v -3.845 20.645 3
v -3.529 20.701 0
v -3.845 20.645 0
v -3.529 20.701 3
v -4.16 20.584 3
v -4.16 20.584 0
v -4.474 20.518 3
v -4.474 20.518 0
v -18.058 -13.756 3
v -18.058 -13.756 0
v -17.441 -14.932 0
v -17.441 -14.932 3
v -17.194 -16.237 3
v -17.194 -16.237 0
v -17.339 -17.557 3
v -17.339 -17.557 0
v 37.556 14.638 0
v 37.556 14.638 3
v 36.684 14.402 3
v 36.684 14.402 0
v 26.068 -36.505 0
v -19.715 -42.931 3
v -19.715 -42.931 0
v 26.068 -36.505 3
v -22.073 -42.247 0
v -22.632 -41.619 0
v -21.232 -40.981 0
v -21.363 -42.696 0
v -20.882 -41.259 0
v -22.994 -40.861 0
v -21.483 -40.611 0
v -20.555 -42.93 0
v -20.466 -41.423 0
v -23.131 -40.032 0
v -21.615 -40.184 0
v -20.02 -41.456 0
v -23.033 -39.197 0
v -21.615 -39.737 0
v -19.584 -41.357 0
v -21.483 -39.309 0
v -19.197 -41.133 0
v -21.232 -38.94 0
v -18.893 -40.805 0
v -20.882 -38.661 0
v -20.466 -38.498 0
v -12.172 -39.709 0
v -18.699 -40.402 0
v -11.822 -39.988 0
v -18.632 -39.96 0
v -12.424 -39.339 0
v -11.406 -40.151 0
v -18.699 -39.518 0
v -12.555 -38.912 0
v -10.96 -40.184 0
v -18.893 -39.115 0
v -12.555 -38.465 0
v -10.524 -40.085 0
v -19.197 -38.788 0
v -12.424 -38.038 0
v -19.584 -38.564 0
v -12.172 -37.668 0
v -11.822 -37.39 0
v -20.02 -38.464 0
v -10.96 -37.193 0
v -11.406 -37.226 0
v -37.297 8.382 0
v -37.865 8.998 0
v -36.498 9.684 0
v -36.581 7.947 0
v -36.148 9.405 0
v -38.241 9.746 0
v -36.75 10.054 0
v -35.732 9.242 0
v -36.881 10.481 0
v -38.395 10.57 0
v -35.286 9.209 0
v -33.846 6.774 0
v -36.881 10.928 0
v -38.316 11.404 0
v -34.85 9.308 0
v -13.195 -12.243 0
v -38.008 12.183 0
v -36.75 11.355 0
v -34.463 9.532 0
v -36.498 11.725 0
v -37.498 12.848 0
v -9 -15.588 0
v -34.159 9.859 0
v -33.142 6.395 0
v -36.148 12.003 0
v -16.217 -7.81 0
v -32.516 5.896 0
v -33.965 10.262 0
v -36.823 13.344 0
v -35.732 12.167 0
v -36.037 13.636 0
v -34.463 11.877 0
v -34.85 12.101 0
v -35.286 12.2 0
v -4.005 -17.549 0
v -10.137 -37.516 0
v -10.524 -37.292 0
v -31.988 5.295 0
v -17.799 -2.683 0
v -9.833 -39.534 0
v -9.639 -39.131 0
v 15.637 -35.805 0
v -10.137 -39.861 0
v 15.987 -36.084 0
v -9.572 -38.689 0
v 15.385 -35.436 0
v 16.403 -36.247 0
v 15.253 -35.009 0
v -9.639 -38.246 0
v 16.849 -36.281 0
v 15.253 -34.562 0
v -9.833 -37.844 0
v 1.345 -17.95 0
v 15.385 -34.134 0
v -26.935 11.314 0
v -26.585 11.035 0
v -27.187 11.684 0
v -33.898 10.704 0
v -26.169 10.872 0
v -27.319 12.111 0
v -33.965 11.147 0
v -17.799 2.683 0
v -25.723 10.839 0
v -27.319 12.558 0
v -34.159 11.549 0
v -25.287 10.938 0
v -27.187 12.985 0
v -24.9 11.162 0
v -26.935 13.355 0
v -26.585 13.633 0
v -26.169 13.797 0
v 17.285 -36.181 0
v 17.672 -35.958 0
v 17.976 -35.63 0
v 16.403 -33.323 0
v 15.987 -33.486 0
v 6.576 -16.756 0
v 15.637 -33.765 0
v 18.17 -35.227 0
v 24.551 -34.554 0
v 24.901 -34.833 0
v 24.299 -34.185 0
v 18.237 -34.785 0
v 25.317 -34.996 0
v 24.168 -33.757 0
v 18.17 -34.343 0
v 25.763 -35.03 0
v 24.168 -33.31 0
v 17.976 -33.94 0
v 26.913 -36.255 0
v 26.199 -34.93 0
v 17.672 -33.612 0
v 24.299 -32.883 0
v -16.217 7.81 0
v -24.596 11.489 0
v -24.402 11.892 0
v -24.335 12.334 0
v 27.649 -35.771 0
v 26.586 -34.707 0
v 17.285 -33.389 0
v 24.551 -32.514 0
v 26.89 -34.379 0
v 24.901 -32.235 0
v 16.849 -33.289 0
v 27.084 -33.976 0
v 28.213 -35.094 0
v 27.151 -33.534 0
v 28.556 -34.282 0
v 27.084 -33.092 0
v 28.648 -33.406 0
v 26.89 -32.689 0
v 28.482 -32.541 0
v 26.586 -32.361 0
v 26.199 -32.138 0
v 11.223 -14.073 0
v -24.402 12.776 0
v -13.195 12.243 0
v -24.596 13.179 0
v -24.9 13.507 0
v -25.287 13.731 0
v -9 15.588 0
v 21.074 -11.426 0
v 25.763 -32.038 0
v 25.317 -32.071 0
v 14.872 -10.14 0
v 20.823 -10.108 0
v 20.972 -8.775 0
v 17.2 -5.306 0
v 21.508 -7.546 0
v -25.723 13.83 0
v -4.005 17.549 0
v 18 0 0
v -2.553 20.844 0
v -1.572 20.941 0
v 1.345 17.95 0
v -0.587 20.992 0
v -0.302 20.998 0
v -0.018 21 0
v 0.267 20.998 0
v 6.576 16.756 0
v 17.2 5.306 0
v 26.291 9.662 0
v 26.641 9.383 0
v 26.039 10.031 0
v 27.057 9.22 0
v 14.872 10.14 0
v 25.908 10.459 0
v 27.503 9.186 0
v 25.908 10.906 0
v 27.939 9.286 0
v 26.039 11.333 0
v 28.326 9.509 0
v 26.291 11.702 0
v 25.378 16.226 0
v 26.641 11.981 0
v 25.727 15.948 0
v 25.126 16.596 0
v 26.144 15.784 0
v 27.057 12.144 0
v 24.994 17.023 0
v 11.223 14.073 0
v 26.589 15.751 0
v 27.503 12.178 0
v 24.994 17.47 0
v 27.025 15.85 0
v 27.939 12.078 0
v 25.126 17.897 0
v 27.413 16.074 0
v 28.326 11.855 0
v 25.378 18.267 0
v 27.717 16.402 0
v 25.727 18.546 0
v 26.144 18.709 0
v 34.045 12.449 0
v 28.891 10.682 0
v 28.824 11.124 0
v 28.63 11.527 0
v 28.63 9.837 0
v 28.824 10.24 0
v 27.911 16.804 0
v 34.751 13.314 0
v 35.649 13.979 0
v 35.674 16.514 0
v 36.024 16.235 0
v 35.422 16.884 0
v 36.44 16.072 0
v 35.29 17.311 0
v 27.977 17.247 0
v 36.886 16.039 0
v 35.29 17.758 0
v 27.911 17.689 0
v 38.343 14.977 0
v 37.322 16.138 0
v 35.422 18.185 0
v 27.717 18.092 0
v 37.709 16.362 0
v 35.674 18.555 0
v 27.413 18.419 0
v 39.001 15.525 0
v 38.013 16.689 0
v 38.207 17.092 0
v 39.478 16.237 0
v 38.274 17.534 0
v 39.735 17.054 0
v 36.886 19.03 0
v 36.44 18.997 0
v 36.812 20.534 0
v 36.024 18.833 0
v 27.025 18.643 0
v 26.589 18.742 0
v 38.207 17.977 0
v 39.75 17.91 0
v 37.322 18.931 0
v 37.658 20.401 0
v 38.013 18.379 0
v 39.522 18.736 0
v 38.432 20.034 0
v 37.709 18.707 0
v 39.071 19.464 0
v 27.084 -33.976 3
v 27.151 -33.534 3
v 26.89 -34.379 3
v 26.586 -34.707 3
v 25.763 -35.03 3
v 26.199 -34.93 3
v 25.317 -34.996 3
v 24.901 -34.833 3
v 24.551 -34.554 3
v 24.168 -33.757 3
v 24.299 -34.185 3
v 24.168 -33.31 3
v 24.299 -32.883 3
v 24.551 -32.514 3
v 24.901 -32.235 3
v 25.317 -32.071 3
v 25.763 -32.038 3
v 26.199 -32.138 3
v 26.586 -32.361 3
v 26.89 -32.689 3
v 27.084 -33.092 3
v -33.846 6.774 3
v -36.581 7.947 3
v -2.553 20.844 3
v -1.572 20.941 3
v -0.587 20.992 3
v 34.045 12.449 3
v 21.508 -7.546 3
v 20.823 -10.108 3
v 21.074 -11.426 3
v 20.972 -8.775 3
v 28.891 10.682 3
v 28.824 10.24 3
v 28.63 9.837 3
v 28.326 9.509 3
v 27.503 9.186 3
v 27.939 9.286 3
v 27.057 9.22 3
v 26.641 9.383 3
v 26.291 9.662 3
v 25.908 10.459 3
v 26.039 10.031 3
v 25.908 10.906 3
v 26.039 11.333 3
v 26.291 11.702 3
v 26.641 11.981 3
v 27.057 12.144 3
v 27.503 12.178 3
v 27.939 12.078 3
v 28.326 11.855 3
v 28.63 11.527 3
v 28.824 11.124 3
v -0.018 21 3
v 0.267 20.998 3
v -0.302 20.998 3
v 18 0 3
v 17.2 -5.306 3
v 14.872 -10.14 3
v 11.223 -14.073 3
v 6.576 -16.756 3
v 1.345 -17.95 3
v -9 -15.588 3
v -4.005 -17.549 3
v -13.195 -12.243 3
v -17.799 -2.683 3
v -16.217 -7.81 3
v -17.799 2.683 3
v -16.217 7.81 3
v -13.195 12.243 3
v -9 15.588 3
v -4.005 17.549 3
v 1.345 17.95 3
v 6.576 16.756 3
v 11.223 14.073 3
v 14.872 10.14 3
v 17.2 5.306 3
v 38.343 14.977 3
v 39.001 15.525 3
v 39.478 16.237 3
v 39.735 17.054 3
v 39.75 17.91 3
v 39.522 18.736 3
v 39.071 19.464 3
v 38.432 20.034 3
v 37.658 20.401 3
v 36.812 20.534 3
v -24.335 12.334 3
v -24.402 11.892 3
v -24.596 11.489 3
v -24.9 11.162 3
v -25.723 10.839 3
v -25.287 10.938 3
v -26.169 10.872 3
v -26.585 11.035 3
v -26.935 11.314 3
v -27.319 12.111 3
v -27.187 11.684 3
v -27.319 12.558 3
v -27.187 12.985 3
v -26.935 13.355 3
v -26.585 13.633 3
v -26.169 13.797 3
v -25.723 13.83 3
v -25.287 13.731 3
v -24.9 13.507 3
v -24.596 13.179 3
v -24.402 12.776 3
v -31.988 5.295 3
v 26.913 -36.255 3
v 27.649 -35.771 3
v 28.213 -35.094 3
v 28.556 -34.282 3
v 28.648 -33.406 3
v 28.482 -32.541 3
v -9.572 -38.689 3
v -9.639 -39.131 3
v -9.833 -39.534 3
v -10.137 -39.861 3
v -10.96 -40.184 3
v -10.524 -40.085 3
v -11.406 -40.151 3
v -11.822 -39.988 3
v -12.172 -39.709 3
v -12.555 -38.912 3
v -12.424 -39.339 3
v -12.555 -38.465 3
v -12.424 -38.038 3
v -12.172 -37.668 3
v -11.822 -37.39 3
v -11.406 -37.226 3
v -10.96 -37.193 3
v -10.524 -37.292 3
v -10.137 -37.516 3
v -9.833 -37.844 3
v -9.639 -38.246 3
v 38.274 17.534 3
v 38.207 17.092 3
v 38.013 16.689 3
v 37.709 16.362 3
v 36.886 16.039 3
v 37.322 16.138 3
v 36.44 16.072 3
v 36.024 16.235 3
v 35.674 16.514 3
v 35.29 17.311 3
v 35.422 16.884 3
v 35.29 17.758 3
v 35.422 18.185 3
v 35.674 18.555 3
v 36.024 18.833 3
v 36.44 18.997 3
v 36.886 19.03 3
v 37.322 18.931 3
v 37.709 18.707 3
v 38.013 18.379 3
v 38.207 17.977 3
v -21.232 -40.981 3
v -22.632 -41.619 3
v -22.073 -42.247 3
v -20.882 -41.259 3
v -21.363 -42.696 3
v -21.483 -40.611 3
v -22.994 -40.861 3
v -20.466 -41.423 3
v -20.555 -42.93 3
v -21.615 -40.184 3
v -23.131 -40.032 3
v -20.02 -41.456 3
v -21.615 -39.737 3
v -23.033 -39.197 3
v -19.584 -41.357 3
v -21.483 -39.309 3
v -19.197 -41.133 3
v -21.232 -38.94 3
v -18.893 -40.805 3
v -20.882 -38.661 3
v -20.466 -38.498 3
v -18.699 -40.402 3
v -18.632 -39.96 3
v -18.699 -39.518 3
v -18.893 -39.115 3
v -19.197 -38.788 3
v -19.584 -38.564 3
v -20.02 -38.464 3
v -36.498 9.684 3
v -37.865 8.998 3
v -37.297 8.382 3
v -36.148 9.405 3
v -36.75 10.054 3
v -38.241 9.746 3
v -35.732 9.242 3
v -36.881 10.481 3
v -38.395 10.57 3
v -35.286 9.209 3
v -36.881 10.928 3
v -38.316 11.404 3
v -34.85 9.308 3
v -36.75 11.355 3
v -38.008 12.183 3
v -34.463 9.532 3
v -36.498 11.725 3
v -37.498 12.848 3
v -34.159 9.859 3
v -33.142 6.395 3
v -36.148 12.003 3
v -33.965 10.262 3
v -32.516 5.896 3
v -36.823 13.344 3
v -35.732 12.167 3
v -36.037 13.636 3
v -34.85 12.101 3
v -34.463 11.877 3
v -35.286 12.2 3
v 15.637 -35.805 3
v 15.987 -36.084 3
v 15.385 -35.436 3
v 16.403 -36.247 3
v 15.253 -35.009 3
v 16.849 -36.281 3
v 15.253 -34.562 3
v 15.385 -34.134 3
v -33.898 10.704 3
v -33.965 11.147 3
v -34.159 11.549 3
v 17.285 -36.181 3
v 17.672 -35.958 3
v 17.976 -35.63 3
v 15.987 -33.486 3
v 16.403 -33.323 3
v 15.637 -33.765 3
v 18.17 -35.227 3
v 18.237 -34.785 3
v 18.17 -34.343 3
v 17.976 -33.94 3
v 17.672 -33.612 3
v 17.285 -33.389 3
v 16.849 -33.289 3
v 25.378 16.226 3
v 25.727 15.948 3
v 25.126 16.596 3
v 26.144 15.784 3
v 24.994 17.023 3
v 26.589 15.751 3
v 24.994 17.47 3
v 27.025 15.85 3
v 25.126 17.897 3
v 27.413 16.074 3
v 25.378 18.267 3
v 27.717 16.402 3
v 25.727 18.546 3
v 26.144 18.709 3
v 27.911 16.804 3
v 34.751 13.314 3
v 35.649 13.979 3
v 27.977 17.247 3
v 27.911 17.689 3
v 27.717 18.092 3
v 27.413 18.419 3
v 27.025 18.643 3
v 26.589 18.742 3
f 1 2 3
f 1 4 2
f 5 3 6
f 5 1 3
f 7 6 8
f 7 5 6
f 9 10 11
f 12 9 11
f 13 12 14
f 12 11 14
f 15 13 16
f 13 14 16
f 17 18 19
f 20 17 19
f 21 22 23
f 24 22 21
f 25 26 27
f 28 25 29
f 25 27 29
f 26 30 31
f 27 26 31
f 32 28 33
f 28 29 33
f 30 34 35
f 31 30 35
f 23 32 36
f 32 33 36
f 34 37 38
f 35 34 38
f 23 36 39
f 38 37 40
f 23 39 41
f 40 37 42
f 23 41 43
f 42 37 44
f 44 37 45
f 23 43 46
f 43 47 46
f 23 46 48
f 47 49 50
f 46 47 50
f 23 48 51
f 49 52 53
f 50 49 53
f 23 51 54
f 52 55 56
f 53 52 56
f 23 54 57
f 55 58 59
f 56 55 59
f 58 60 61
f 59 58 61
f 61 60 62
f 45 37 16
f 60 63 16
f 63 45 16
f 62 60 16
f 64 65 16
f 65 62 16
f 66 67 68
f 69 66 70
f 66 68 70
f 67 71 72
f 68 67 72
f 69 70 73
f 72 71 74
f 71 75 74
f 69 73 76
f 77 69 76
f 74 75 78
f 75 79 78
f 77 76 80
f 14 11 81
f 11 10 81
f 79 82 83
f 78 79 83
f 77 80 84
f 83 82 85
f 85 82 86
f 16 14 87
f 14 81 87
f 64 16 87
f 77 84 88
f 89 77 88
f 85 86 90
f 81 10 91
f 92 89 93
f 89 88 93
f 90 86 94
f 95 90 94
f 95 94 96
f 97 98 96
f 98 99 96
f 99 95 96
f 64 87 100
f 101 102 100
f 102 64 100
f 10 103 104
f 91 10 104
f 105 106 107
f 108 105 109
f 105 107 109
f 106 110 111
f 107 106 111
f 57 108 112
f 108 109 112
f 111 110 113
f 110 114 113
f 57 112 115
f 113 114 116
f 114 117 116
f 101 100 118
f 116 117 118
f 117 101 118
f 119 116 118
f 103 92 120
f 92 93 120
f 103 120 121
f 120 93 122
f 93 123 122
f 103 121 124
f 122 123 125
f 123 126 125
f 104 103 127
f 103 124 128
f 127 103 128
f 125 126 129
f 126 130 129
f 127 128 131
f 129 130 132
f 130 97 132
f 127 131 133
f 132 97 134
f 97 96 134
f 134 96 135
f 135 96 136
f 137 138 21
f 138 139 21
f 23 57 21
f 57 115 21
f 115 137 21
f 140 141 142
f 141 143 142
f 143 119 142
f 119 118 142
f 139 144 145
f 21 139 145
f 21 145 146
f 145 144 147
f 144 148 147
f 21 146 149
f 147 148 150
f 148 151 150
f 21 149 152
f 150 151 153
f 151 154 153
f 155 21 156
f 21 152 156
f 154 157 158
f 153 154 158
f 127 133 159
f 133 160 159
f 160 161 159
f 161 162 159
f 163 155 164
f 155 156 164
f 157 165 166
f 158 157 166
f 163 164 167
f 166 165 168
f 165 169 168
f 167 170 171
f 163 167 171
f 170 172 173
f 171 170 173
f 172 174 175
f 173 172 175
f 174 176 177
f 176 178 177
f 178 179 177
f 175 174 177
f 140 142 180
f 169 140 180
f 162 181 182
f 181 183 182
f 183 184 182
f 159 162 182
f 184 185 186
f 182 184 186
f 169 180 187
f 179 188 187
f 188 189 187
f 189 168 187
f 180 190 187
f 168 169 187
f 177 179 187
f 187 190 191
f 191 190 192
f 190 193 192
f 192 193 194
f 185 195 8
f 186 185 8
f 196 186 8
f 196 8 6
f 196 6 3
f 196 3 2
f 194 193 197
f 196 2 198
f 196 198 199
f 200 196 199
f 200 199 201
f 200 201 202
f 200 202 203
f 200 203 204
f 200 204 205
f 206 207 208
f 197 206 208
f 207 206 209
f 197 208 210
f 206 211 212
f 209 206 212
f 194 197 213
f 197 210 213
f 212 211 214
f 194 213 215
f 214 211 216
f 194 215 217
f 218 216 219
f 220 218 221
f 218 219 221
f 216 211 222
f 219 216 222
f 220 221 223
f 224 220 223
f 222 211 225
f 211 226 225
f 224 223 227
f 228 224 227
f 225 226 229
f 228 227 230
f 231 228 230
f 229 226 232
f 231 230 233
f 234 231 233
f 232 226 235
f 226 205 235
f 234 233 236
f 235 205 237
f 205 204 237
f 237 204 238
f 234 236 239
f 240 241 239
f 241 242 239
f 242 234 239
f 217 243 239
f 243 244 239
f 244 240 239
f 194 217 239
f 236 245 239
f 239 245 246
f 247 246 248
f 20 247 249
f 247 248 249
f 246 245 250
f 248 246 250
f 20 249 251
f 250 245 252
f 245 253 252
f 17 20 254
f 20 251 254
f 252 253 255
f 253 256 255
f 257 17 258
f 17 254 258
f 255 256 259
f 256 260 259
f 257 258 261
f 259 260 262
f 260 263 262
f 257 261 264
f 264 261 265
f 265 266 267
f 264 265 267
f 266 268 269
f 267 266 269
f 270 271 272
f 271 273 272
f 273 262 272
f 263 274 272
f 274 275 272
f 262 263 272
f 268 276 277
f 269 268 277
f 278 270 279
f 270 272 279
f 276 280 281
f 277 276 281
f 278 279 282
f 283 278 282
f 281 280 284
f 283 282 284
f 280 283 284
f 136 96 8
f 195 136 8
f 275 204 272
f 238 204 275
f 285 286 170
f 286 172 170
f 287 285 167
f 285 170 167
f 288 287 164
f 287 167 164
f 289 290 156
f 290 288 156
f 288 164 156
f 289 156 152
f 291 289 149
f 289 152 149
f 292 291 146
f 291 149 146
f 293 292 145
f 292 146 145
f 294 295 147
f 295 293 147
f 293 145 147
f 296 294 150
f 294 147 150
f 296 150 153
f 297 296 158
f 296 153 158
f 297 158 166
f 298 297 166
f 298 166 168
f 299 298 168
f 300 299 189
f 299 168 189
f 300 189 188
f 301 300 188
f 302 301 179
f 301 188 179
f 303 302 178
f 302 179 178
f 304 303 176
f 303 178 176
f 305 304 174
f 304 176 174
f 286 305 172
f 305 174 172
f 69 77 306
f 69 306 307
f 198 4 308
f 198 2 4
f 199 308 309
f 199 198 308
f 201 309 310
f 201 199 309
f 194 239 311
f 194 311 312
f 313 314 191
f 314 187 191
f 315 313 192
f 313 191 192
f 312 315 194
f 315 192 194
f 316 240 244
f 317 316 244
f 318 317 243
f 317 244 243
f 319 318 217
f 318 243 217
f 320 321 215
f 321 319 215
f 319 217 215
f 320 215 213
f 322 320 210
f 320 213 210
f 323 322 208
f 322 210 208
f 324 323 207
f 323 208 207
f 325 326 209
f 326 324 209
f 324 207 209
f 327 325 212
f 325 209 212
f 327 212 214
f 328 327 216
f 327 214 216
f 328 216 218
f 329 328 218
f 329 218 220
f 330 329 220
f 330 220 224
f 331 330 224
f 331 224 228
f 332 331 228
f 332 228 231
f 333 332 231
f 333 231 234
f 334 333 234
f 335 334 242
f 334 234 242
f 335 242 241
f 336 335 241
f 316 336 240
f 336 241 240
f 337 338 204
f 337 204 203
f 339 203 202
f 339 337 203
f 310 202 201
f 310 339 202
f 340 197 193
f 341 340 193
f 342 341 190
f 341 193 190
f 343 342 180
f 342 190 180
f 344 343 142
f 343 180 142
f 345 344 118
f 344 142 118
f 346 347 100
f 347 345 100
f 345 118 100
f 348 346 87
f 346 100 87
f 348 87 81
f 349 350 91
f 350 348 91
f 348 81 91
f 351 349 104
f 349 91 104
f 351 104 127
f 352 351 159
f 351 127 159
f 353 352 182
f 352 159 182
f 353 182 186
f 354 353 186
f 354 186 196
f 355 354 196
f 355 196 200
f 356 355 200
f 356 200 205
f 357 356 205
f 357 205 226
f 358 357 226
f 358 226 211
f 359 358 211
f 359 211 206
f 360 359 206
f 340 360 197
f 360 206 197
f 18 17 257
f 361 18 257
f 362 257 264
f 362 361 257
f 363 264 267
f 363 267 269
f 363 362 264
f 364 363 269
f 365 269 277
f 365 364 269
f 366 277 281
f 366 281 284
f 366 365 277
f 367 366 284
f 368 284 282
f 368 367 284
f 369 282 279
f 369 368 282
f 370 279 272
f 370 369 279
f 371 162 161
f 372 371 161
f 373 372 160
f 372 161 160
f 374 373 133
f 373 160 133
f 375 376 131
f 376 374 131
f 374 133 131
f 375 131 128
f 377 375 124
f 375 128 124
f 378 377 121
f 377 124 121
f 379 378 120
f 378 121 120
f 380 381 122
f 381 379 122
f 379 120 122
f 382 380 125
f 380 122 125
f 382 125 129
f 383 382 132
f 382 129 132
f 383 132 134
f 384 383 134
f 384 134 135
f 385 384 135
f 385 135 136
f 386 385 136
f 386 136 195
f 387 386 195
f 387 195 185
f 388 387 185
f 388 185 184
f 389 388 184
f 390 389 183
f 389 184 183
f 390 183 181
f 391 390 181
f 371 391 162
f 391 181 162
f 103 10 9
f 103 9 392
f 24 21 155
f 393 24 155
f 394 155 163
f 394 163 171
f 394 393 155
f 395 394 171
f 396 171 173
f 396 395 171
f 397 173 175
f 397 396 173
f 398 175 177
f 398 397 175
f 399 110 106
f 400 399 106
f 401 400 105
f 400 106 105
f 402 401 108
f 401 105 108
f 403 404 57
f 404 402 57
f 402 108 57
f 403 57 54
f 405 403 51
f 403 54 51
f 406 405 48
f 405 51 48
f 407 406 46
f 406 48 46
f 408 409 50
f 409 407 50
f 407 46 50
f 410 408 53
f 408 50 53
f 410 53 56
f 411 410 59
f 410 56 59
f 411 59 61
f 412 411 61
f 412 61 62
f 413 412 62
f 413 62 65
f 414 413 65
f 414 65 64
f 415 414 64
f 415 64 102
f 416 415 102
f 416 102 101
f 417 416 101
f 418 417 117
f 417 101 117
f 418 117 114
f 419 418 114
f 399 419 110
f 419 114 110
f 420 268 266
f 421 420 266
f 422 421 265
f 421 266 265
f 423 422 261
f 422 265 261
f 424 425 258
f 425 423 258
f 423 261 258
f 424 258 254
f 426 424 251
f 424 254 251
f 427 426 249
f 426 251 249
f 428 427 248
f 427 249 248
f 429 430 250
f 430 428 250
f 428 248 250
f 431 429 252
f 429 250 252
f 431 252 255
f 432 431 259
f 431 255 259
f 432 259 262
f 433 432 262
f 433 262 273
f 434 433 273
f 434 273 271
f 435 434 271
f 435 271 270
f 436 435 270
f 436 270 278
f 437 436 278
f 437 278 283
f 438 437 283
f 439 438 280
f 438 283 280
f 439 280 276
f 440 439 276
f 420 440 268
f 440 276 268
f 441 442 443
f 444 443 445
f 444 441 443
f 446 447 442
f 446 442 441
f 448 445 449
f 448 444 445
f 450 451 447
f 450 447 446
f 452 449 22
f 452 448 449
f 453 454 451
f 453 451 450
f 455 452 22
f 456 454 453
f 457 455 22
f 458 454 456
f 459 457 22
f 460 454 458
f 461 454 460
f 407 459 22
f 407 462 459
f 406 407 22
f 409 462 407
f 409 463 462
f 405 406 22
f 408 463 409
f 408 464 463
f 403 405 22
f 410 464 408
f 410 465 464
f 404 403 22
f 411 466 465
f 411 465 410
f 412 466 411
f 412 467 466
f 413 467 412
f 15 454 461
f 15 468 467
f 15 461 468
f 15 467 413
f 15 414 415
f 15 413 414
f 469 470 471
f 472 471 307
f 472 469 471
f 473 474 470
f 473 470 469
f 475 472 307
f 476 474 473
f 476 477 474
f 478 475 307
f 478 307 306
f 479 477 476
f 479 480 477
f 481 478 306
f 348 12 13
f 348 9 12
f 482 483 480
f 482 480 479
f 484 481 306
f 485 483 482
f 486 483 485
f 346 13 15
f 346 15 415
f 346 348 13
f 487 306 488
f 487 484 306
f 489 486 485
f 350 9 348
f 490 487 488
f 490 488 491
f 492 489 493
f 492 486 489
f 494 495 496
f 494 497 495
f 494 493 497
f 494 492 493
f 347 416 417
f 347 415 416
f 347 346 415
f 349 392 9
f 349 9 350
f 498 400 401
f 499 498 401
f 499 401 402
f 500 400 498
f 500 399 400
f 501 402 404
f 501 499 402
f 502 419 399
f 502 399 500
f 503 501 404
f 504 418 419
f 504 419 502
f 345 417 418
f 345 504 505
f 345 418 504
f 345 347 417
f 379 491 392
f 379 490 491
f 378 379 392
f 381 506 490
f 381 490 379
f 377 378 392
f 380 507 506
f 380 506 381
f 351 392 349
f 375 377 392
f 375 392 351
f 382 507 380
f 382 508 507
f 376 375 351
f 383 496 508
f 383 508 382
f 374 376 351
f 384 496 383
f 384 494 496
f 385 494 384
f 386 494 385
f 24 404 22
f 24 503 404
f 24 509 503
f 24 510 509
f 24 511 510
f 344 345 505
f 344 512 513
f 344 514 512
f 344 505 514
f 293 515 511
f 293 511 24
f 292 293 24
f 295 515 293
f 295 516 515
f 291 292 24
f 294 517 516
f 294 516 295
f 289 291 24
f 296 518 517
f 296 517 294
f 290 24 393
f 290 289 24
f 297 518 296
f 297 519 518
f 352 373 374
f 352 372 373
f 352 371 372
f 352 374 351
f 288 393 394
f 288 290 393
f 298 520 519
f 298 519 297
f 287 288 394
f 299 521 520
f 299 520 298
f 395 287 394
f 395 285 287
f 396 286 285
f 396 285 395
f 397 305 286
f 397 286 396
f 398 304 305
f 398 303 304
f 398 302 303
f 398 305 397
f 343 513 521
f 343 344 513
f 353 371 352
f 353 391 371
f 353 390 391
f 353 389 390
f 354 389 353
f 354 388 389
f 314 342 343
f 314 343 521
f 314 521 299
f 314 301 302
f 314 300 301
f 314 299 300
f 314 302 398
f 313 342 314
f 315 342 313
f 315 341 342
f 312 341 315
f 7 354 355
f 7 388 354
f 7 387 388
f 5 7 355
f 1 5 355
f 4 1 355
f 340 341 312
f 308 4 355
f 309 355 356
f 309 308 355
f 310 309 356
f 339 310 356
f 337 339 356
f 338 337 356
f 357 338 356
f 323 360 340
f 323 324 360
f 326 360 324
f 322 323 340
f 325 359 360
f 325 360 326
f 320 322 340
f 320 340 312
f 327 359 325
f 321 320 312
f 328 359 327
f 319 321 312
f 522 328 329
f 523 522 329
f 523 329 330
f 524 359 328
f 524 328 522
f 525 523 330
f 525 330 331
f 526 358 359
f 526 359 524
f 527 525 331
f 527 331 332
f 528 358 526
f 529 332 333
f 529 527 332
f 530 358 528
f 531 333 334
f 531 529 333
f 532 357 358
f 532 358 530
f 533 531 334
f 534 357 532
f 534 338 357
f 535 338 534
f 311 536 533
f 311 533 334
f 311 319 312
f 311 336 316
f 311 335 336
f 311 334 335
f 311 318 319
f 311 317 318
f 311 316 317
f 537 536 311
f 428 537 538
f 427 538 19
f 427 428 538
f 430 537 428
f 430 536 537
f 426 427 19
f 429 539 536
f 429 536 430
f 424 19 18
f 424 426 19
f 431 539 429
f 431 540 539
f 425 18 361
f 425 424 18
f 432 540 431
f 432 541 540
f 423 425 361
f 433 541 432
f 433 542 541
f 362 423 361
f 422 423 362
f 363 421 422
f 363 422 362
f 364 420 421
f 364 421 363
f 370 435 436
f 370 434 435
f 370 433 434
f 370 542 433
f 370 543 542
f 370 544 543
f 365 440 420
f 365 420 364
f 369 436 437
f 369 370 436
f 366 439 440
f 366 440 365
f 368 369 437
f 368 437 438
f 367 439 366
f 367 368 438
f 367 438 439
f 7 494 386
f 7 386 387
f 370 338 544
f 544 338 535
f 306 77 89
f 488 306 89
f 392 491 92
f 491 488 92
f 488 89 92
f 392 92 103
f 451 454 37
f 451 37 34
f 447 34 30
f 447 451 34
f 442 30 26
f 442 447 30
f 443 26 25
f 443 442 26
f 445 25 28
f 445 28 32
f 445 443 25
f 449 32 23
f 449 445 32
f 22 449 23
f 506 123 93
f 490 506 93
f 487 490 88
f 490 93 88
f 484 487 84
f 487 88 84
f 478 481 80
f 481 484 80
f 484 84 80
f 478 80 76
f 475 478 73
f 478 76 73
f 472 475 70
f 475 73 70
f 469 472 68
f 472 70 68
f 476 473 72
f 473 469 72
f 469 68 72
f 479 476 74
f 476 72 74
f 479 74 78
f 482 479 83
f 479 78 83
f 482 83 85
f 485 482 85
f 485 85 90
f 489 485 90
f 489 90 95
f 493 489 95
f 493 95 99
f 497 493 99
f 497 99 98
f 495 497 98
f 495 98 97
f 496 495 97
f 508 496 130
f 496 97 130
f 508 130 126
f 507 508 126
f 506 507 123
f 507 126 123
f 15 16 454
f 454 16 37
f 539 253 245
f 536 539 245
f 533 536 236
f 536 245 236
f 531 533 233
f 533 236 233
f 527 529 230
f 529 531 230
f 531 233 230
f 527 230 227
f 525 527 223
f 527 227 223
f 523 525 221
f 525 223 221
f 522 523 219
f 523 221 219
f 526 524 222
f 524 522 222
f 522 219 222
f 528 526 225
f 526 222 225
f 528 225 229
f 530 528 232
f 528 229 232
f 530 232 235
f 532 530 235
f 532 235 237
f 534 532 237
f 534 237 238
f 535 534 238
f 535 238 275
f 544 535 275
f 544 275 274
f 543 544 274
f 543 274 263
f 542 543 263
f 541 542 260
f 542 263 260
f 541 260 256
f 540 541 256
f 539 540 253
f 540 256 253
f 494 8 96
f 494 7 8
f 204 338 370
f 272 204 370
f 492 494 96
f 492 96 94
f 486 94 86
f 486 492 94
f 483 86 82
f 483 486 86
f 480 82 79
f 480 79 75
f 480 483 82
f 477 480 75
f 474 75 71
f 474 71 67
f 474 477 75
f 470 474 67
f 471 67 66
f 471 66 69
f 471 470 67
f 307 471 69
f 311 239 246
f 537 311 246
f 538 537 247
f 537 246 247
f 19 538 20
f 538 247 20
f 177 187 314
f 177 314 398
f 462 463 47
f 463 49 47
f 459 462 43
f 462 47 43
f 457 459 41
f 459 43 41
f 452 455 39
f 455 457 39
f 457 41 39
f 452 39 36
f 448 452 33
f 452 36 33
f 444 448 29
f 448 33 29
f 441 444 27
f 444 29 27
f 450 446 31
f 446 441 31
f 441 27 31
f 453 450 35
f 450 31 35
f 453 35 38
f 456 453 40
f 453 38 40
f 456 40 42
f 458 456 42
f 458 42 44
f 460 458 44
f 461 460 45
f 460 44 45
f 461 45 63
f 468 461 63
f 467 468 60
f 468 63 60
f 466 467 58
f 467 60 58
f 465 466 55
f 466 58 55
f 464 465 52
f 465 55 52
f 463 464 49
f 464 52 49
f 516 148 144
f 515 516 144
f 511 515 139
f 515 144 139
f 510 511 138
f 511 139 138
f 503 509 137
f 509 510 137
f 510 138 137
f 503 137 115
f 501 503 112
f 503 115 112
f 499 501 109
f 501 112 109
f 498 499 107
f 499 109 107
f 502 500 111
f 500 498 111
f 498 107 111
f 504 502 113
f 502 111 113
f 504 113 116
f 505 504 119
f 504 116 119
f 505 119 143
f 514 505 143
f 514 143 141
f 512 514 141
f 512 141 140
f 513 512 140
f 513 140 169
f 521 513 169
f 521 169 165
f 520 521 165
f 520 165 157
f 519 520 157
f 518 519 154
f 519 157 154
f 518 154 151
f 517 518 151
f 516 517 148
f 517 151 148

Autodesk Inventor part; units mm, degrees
ref_plane "YZ Plane" through (0, 0, 0) normal (1, 0, 0) x (0, 1, 0)
ref_plane "XZ Plane" through (0, 0, 0) normal (0, 1, 0) x (-1, 0, 0)
ref_plane "XY Plane" through (0, 0, 0) normal (0, 0, 1) x (1, 0, 0)
sketch "スケッチ1" plane through (0, 0, 0) normal (0, 0, 1) x (1, 0, 0)
  circle A0 centre (0, 0) radius 20.55 construction
  circle A1 centre (-21.690847, -16.4118) radius 19.1 construction
  circle A2 centre (25.320198, -9.936175) radius 19.1 construction
  circle A3 centre (-50.601037, 30.814282) radius 1.5
  circle A4 centre (5.936242, 53.5882) radius 1.5
  circle A5 centre (27.390781, 10.682087) radius 1.5
  circle A6 centre (-42.891368, 18.388671) radius 1.5
  circle A7 centre (-21.690847, -16.4118) radius 4.025
  circle A8 centre (25.320198, -9.936175) radius 4.025
  circle A9 centre (0, 0) radius 4
  line L0 (-17.878475, -18.802579) -> (-30.416782, -38.796349) construction
  arc A10 (-17.878475, -18.802579) -> (-19.249319, -12.631728) centre (-21.690847, -16.4118) ccw construction
  line L1 (-19.249319, -12.631728) -> (-39.073694, 0.17273) construction
  line L2 (37.140856, -30.852246) -> (21.88658, -12.844829) construction
  arc A11 (22.365904, -6.541746) -> (21.88658, -12.844829) centre (25.320198, -9.936175) ccw construction
  line L3 (22.365904, -6.541746) -> (40.167798, 8.951885) construction
  line L4 (-21.690847, -16.4118) -> (-99.974162, 13.5882) construction
  line L5 (-105.525669, -16.4118) -> (-21.690847, -16.4118) construction
  line L6 (-21.690847, -16.4118) -> (-101.711328, -41.4118) construction
  line L7 (25.320198, -9.936175) -> (102.538646, -46.4118) construction
  line L8 (110.474331, -16.4118) -> (25.320198, -9.936175) construction
  line L9 (25.320198, -9.936175) -> (108.686903, 8.5882) construction
  line L10 (-18.05831, -13.755735) -> (-31.987893, 5.294901) construction
  line L11 (-17.338988, -17.556932) -> (-24.536725, -44.910558) construction
  line L12 (21.507701, -7.545597) -> (34.044954, 12.448834) construction
  line L13 (21.073936, -11.425892) -> (31.605914, -41.446035) construction
  arc A12 (-24.617584, -40.320148) -> (-19.506478, -44.416573) centre (-20.131998, -39.96026) ccw
  circle A13 centre (-20.131998, -39.96026) radius 3 construction
  arc A14 (-38.987898, 7.990671) -> (-39.33593, 8.526197) centre (-35.398239, 10.704405) ccw construction
  circle A15 centre (-35.398239, 10.704405) radius 3 construction
  arc A16 (-31.987893, 5.294901) -> (-33.846468, 6.774421) centre (-35.620429, 2.638836) ccw construction
  circle A17 centre (-41.515222, -3.607342) radius 1.5
  line L14 (-33.846468, 6.774421) -> (-56.065957, 16.305484) construction
  line L15 (-41.338636, 0.889192) -> (-72.631748, 2.118122) construction
  circle A18 centre (-42.891368, 18.388671) radius 3 construction
  circle A19 centre (-35.398239, 10.704405) radius 1.5
  circle A20 centre (36.773621, 17.534376) radius 1.5
  arc A21 (40.794171, 15.513193) -> (40.193362, 20.459332) centre (36.773621, 17.534376) ccw
  circle A22 centre (25.650815, -33.533859) radius 1.5
  arc A23 (26.276335, -37.990172) -> (30.150786, -33.517807) centre (25.650815, -33.533859) ccw
  circle A24 centre (36.773621, 17.534376) radius 3 construction
  circle A25 centre (25.650815, -33.533859) radius 3 construction
  arc A26 (36.683586, 14.402452) -> (34.044954, 12.448834) centre (37.857452, 10.058256) ccw construction
  line L16 (36.683586, 14.402452) -> (64.196789, 21.836927) construction
  line L17 (43.259945, 10.055344) -> (82.927317, 8.839597) construction
  circle A27 centre (27.390781, 10.682087) radius 3 construction
  circle A28 centre (-21.690847, -16.4118) radius 7.025 construction
  circle A29 centre (25.320198, -9.936175) radius 7.025 construction
  arc A30 (40.859312, 15.648342) -> (30.150786, -33.517807) centre (146.468505, -33.102887) ccw
  arc A31 (-24.617584, -40.320148) -> (-39.182737, 8.248399) centre (-145.115849, -49.987967) ccw
  arc A32 (-52.28241, 34.988367) -> (-54.190695, 28.100548) centre (-50.601037, 30.814282) ccw
  arc A33 (9.355983, 56.513156) -> (4.254869, 57.762285) centre (5.936242, 53.5882) ccw
  line L18 (-39.182737, 8.248399) -> (-54.190695, 28.100548)
  line L19 (-52.28241, 34.988367) -> (4.254869, 57.762285)
  line L20 (9.355983, 56.513156) -> (40.193362, 20.459332)
  line L21 (-19.506478, -44.416573) -> (26.276335, -37.990172)
  circle A34 centre (-20.131998, -39.96026) radius 1.5
  line L22 (-23.886768, -42.440522) -> (-17.338988, -17.556932)
  arc A35 (-17.338988, -17.556932) -> (-18.05831, -13.755735) centre (-21.690847, -16.4118) ccw
  line L23 (-18.05831, -13.755735) -> (-31.987893, 5.294901)
  arc A36 (-31.987893, 5.294901) -> (-33.846468, 6.774421) centre (-35.620429, 2.638836) ccw
  line L24 (-33.846468, 6.774421) -> (-40.094568, 9.454547)
  line L25 (40.797436, 15.514075) -> (36.683586, 14.402452)
  arc A37 (36.683586, 14.402452) -> (34.044954, 12.448834) centre (37.857452, 10.058256) ccw
  line L26 (34.044954, 12.448834) -> (21.507701, -7.545597)
  arc A38 (21.507701, -7.545597) -> (21.073936, -11.425892) centre (25.320198, -9.936175) ccw
  line L27 (21.073936, -11.425892) -> (29.592026, -35.70569)
  circle A39 centre (0, 0) radius 10.1 construction
  circle A40 centre (25.320198, -9.936175) radius 17.1 construction
  circle A41 centre (110.474331, -16.4118) radius 28.1 construction
  circle A42 centre (62.413099, -12.756939) radius 20.1 construction
  circle A43 centre (-21.690847, -16.4118) radius 17.1 construction
  circle A44 centre (-105.525669, -16.4118) radius 28.1 construction
  line L28 (-170.91498, -81.4118) -> (490.004419, -81.4118)
  line L29 (-105.525669, -16.4118) -> (-21.690847, -16.4118) construction
  line L30 (110.474331, -16.4118) -> (25.320198, -9.936175) construction
  line L31 (110.474331, -16.4118) -> (104.150058, -0.631953)
  line L32 (104.150058, -0.631953) -> (95.593688, 20.717252) construction
  line L33 (95.593688, 20.717252) -> (70.474331, -10.4118) construction
  line L34 (70.474331, -10.4118) -> (110.474331, -16.4118) construction
  line L35 (-137.681852, 53.5882) -> (165.818568, 53.5882)
  line L36 (25.320198, -9.936175) -> (108.686903, 8.5882) construction
  line L37 (25.320198, -9.936175) -> (102.538646, -46.4118) construction
  line L38 (25.320198, -9.936175) -> (5.936242, 53.5882) construction
  line L39 (5.936242, 53.5882) -> (127.64315, 30.26217)
  line L40 (127.64315, 30.26217) -> (110.474331, -16.4118) construction
  line L41 (102.538646, -46.4118) -> (118.068109, 0.832921) construction
  line L42 (118.068109, 0.832921) -> (5.936242, 53.5882) construction
  line L43 (108.686903, 8.5882) -> (129.858294, 53.5882) construction
  line L44 (129.858294, 53.5882) -> (5.936242, 53.5882) construction
  line L45 (119.272599, 31.0882) -> (366.444098, 68.5882) construction
  line L46 (119.05874, 6.925185) -> (362.021337, 65.824902) construction
  line L47 (110.303378, -22.78944) -> (351.062397, 44.553669) construction
  line L48 (127.64315, 30.26217) -> (4.192658, 19.461651) construction
  circle A45 centre (80.474331, 23.123973) radius 3 construction
  circle A46 centre (80.474331, 23.123973) radius 1.5
  arc A47 (79.800999, 27.573313) -> (76.161969, 24.409872) centre (80.474331, 23.123973) ccw
  circle A48 centre (70.474331, -10.4118) radius 1.5
  arc A49 (66.161969, -9.125901) -> (69.424217, -14.787558) centre (70.474331, -10.4118) ccw
  circle A50 centre (150.474331, 0.5882) radius 1.5
  arc A51 (152.562257, -3.398097) -> (154.040845, 3.33228) centre (150.474331, 0.5882) ccw
  circle A52 centre (127.64315, 30.26217) radius 1.5
  arc A53 (131.281576, 32.91016) -> (126.969818, 34.71151) centre (127.64315, 30.26217) ccw
  circle A54 centre (110.474331, -16.4118) radius 5
  arc A55 (108.607462, -24.190926) -> (114.186199, -23.49855) centre (110.474331, -16.4118) ccw
  line L49 (76.161969, 24.409872) -> (66.161969, -9.125901)
  line L50 (69.424217, -14.787558) -> (108.607462, -24.190926)
  line L51 (114.186199, -23.49855) -> (152.562257, -3.398097)
  line L52 (154.040845, 3.33228) -> (131.209664, 33.00625)
  line L53 (126.969818, 34.71151) -> (79.800999, 27.573313)
  circle A56 centre (-145.525669, 0.5882) radius 1.5
  arc A57 (-149.092184, 3.33228) -> (-147.613596, -3.398097) centre (-145.525669, 0.5882) ccw
  circle A58 centre (-105.525669, -16.4118) radius 5
  arc A59 (-109.237538, -23.49855) -> (-103.6588, -24.190926) centre (-105.525669, -16.4118) ccw
  circle A60 centre (-65.525669, -10.4118) radius 1.5
  arc A61 (-64.475556, -14.787558) -> (-61.213308, -9.125901) centre (-65.525669, -10.4118) ccw
  circle A62 centre (0, 0) radius 20.05 construction
  circle A63 centre (110.474331, -16.4118) radius 30.1 construction
  circle A64 centre (62.413099, -12.756939) radius 22.1 construction
  circle A65 centre (25.320198, -9.936175) radius 19.1 construction
  circle A66 centre (0, 0) radius 12.1 construction
  circle A67 centre (-21.690847, -16.4118) radius 19.1 construction
  circle A68 centre (-105.525669, -16.4118) radius 30.1 construction
  circle A69 centre (0, 0) radius 20.55 construction
  circle A70 centre (95.593688, 20.717252) radius 4.025 construction
  circle A71 centre (95.593688, 20.717252) radius 6.025 construction
  circle A72 centre (-75.525669, 23.123973) radius 1.5
  arc A73 (-71.213308, 24.409872) -> (-74.852338, 27.573313) centre (-75.525669, 23.123973) ccw
  circle A74 centre (-122.694488, 30.26217) radius 1.5
  arc A75 (-122.021157, 34.71151) -> (-126.261003, 33.00625) centre (-122.694488, 30.26217) ccw
  line L54 (-126.261003, 33.00625) -> (-149.092184, 3.33228)
  line L55 (-147.613596, -3.398097) -> (-109.237538, -23.49855)
  line L56 (-103.6588, -24.190926) -> (-64.475556, -14.787558)
  line L57 (-61.213308, -9.125901) -> (-71.213308, 24.409872)
  line L58 (-74.852338, 27.573313) -> (-122.021157, 34.71151)
  circle A76 centre (14, -17.4118) radius 2.29213 construction
  circle A77 centre (-14, -17.4118) radius 2.29213 construction
  circle A78 centre (-14, -17.4118) radius 14 construction
  circle A79 centre (14, -17.4118) radius 14 construction
  line L59 (-170.651239, -31.4118) -> (202.86558, -31.4118)
  line L60 (5.936242, 53.5882) -> (-42.252867, 34.177029) construction
  line L61 (5.936242, 53.5882) -> (-29.404465, 15.509095) construction
  circle A80 centre (5.936242, 53.5882) radius 1.5
  arc A81 (9.961109, 55.600773) -> (4.254869, 57.762285) centre (5.936242, 53.5882) ccw
  line L62 (-21.690847, -16.4118) -> (-99.974162, 13.5882) construction
  line L63 (-21.690847, -16.4118) -> (-101.711328, -41.4118) construction
  line L64 (9.961109, 55.600773) -> (31.415648, 12.694659)
  circle A82 centre (-50.601037, 30.814282) radius 1.5
  arc A83 (-52.28241, 34.988367) -> (-54.424801, 28.441767) centre (-50.601037, 30.814282) ccw
  line L65 (4.254869, 57.762285) -> (-52.28241, 34.988367)
  line L66 (-54.424801, 28.441767) -> (-46.715132, 16.016156)
  circle A84 centre (27.390781, 10.682087) radius 3 construction
  circle A85 centre (-84.86606, 5.271327) radius 4.5 construction
  circle A86 centre (-132.017427, -1.981251) radius 4.5 construction
  line L67 (-132.701548, 2.466443) -> (-85.550181, 9.71902) construction
  arc A87 (26.900287, 6.208898) -> (31.415648, 12.694659) centre (27.390781, 10.682087) ccw
  arc A88 (-46.715132, 16.016156) -> (-43.381863, 13.915483) centre (-42.891368, 18.388671) ccw
  line L68 (-43.381863, 13.915483) -> (26.900287, 6.208898)
  circle A89 centre (-42.252867, 34.177029) radius 3 construction
  circle A90 centre (25.320198, -9.936175) radius 4.025 construction
  circle A91 centre (-21.690847, -16.4118) radius 4.025 construction
  circle A92 centre (-42.891368, 18.388671) radius 1.5
  circle A93 centre (27.390781, 10.682087) radius 1.5
  circle A94 centre (-57.813011, 39.770535) radius 4.5 construction
  circle A95 centre (-99.303951, 63.315241) radius 4.5 construction
  line L69 (5.936242, 53.5882) -> (-35.940425, 22.842004) construction
  circle A96 centre (-58.005574, -24.479052) radius 20.1 construction
  circle A97 centre (-58.005574, -24.479052) radius 22.1 construction
  line L70 (-53.326057, 39.428119) -> (-56.279689, 0.724331) construction
  circle A98 centre (-42.252867, 34.177029) radius 4.5
  dimension "d127" = 9
  dimension "d128" = 9
  dimension "d143" = 9
  dimension "d0" = 8.05
  dimension "d1" = 8.05
  dimension "d2" = 8
  dimension "d3" = 20.968
  dimension "d4" = 20.968
  dimension "d5" = 17.3498
  dimension "d6" = 17.3498
  dimension "d7" = 16.8765
  dimension "d8" = 16.8765
  dimension "d9" = 20.9359
  dimension "d10" = 20.9359
  dimension "d11" = 9
  dimension "d12" = 6
  dimension "d13" = 9
  dimension "d14" = 6
  dimension "d15" = 9
  dimension "d16" = 20.968
  dimension "d17" = 20.968
  dimension "d18" = 6
  dimension "d19" = 3
  dimension "d20" = 3
  dimension "d21" = 9
  dimension "d22" = 3
  dimension "d23" = 9
  dimension "d24" = 6
  dimension "d25" = 6
  dimension "d26" = 9
  dimension "d27" = 16.8765
  dimension "d28" = 3
  dimension "d29" = 3
  dimension "d30" = 9
  dimension "d31" = 9
  dimension "d32" = 3
  dimension "d39" = 20.2
  dimension "d40" = 34.2
  dimension "d41" = 56.2
  dimension "d42" = 40.2
  dimension "d43" = 216
  dimension "d44" = 65
  dimension "d45" = 65
  dimension "d46" = 34.2
  dimension "d47" = 56.2
  dimension "d48" = 17
  dimension "d49" = 23
  dimension "d50" = 40
  dimension "d51" = 40
  dimension "d52" = 6
  dimension "d53" = 135
  dimension "d54" = 25
  dimension "d55" = 30
  dimension "d56" = 5
  dimension "d57" = 2
  dimension "d58" = 250
  dimension "d59" = 150
  dimension "d60" = 250
  dimension "d61" = 250
  dimension "d62" = 123.823
  dimension "d63" = 123.823
  dimension "d64" = 123.823
  dimension "d65" = 6
  dimension "d66" = 3
  dimension "d67" = 9
  dimension "d68" = 3
  dimension "d69" = 9
sketch "スケッチ3" plane through (0, 0, 0) normal (0, 0, 1) x (1, 0, 0)
  line L0 (0, 0) -> (0, -41.46026)
  circle A0 centre (25.320198, -9.936175) radius 4.025
  circle A1 centre (25.650815, -33.533859) radius 1.5
  circle A2 centre (36.773621, 17.534376) radius 1.5
  arc A3 (41.059013, 16.161272) -> (32.782059, 19.61222) centre (36.773621, 17.534376) ccw
  line L1 (32.243549, -11.351383) -> (41.059013, 16.161272)
  line L2 (30.131291, -33.952594) -> (32.243549, -11.351383)
  arc A4 (21.183829, -34.077953) -> (30.131291, -33.952594) centre (25.650815, -33.533859) ccw
  line L3 (18.346737, -10.785566) -> (21.183829, -34.077953)
  arc A5 (19.088928, -6.692428) -> (18.346737, -10.785566) centre (25.320198, -9.936175) ccw
  line L4 (32.782059, 19.61222) -> (19.088928, -6.692428)
  circle A6 centre (-21.690847, -16.4118) radius 4.025
  circle A7 centre (-35.398239, 10.704405) radius 1.5
  circle A8 centre (-20.131998, -39.96026) radius 1.5
  arc A9 (-24.564595, -40.736203) -> (-15.635797, -40.145139) centre (-20.131998, -39.96026) ccw
  line L5 (-28.482017, -18.357797) -> (-24.564595, -40.736203)
  line L6 (-39.569097, 9.015043) -> (-28.482017, -18.357797)
  arc A10 (-31.564802, 13.061259) -> (-39.569097, 9.015043) centre (-35.398239, 10.704405) ccw
  line L7 (-15.706425, -12.732489) -> (-31.564802, 13.061259)
  arc A11 (-14.671778, -16.700416) -> (-15.706425, -12.732489) centre (-21.690847, -16.4118) ccw
  line L8 (-15.635797, -40.145139) -> (-14.671778, -16.700416)
  circle A12 centre (25.320198, -9.936175) radius 6
  circle A13 centre (-21.690847, -16.4118) radius 6
sketch "スケッチ2" plane through (0, 0, 0) normal (0, 0, 1) x (1, 0, 0)
  circle A0 centre (0, 0) radius 18
  circle A1 centre (-35.398239, 10.704405) radius 1.5
  line L0 (-33.846468, 6.774421) -> (-39.663363, 9.269581)
  arc A2 (-31.987893, 5.294901) -> (-33.846468, 6.774421) centre (-35.620429, 2.638836) ccw
  line L1 (-18.05831, -13.755735) -> (-31.987893, 5.294901)
  arc A3 (-17.338988, -17.556932) -> (-18.05831, -13.755735) centre (-21.690847, -16.4118) ccw
  line L2 (-17.338988, -17.556932) -> (-23.886768, -42.440522)
  line L3 (21.073936, -11.425892) -> (29.592026, -35.70569)
  arc A4 (21.507701, -7.545597) -> (21.073936, -11.425892) centre (25.320198, -9.936175) ccw
  line L4 (34.044954, 12.448834) -> (21.507701, -7.545597)
  arc A5 (36.683586, 14.402452) -> (34.044954, 12.448834) centre (37.857452, 10.058256) ccw
  line L5 (40.797436, 15.514075) -> (36.683586, 14.402452)
  circle A6 centre (36.773621, 17.534376) radius 1.5
  circle A7 centre (25.650815, -33.533859) radius 1.5
  circle A8 centre (-20.131998, -39.96026) radius 1.5
  arc A9 (-23.886768, -42.440522) -> (-19.506478, -44.416573) centre (-20.131998, -39.96026) ccw
  line L6 (-19.506478, -44.416573) -> (26.276335, -37.990172)
  arc A10 (26.276335, -37.990172) -> (29.592026, -35.70569) centre (25.650815, -33.533859) ccw
  circle A11 centre (27.390781, 10.682087) radius 1.5
  arc A12 (-36.154351, 15.140427) -> (-39.663363, 9.269581) centre (-35.398239, 10.704405) ccw
  arc A13 (40.794171, 15.513193) -> (36.647882, 22.032619) centre (36.773621, 17.534376) ccw
  arc A14 (-0.586782, 20.9918) -> (-3.528521, 20.701438) centre (0, 0) ccw
  line L7 (-36.154351, 15.140427) -> (-3.528521, 20.701438)
  line L8 (-0.586782, 20.9918) -> (36.647882, 22.032619)
  circle A15 centre (14, -17.4118) radius 14 construction
  circle A16 centre (-14, -17.4118) radius 14 construction
  line L9 (-170.651239, -31.4118) -> (202.86558, -31.4118)
  circle A17 centre (-11.072102, -38.688549) radius 3
  circle A18 centre (16.736705, -34.785107) radius 3
  circle A19 centre (26.477393, 17.246566) radius 3
  circle A20 centre (-25.835433, 12.334367) radius 3
  circle A21 centre (0, 0) radius 20.55 construction
  circle A22 centre (-25.835433, 12.334367) radius 1.5
  circle A23 centre (26.477393, 17.246566) radius 1.5
  circle A24 centre (16.736705, -34.785107) radius 1.5
  circle A25 centre (-11.072102, -38.688549) radius 1.5
  circle A26 centre (-11.072102, -38.688549) radius 4.5
  circle A27 centre (16.736705, -34.785107) radius 4.5
  circle A28 centre (26.477393, 17.246566) radius 4.5
  circle A29 centre (-25.835433, 12.334367) radius 4.5
  line L10 (32.782059, 19.61222) -> (19.088928, -6.692428)
  line L11 (-15.706425, -12.732489) -> (-31.564802, 13.061259)
  line L12 (-15.635797, -40.145139) -> (-14.671778, -16.700416)
  line L13 (18.346737, -10.785566) -> (21.183829, -34.077953)
  circle A30 centre (0, 0) radius 4
  dimension "d33" = 36
  dimension "d34" = 9
  dimension "d35" = 9
  dimension "d36" = 3
  dimension "d159" = 6
  dimension "d160" = 6
  dimension "d161" = 6
  dimension "d162" = 6
  dimension "d163" = 3
  dimension "d164" = 3
  dimension "d165" = 3
  dimension "d166" = 3
  dimension "d167" = 9
  dimension "d168" = 9
  dimension "d169" = 9
  dimension "d170" = 9
  dimension "d171" = 8
extrude "押し出し1" add sketch "スケッチ2" along normal blind 3 contours A28 | A29 | L0 A12 L7 A14 L8 A13 L5 A5 L4 A4 L3 L9 A27 L2 A3 L1 A2 | L9 L12 A26 L6 A9 L2 | L9 A27 L6 A26 L12 | A27 L9 | L9 A27 | A26 | L9 L3 A10 L6 A27 | A17 | A18 | A19 | A20 | A22 | A23 | A24 | A25
extrude "押し出し2" cut sketch "スケッチ2" along normal blind 3 contours A22 | A23 | A24 | A25
sketch "スケッチ4" plane through (0, 0, 3) normal (0, 0, 1) x (1, 0, 0)
  circle A0 centre (26.477393, 17.246566) radius 1.5
  circle A1 centre (-11.072102, -38.688549) radius 1.5
  circle A2 centre (16.736705, -34.785107) radius 1.5
  circle A3 centre (-25.835433, 12.334367) radius 1.5
  circle A4 centre (0, 0) radius 18
  circle A5 centre (27.390781, 10.682087) radius 1.5
  circle A6 centre (-20.131998, -39.96026) radius 1.5
  circle A7 centre (25.650815, -33.533859) radius 1.5
  circle A8 centre (36.773621, 17.534376) radius 1.5
  circle A9 centre (-35.398239, 10.704405) radius 1.5
  line L0 (-39.663363, 9.269581) -> (-33.846468, 6.774421)
  arc A10 (-31.987893, 5.294901) -> (-33.846468, 6.774421) centre (-35.620429, 2.638836) ccw
  line L1 (-31.987893, 5.294901) -> (-18.05831, -13.755735)
  arc A11 (-17.338988, -17.556932) -> (-18.05831, -13.755735) centre (-21.690847, -16.4118) ccw
  line L2 (-17.338988, -17.556932) -> (-23.886768, -42.440522)
  arc A12 (-23.886768, -42.440522) -> (-19.506478, -44.416573) centre (-20.131998, -39.96026) ccw
  line L3 (-19.506478, -44.416573) -> (26.276335, -37.990172)
  arc A13 (26.276335, -37.990172) -> (29.592026, -35.70569) centre (25.650815, -33.533859) ccw
  line L4 (29.592026, -35.70569) -> (21.073936, -11.425892)
  arc A14 (21.507701, -7.545597) -> (21.073936, -11.425892) centre (25.320198, -9.936175) ccw
  line L5 (21.507701, -7.545597) -> (34.044954, 12.448834)
  arc A15 (36.683586, 14.402452) -> (34.044954, 12.448834) centre (37.857452, 10.058256) ccw
  line L6 (36.683586, 14.402452) -> (40.794171, 15.513193)
  arc A16 (40.794171, 15.513193) -> (36.647882, 22.032619) centre (36.773621, 17.534376) ccw
  line L7 (36.647882, 22.032619) -> (-0.586782, 20.9918)
  arc A17 (-0.586782, 20.9918) -> (-3.528521, 20.701438) centre (0, 0) ccw
  line L8 (-3.528521, 20.701438) -> (-36.154351, 15.140427)
  arc A18 (-36.154351, 15.140427) -> (-39.663363, 9.269581) centre (-35.398239, 10.704405) ccw
  arc A19 (-36.037367, 13.635534) -> (-36.58088, 7.947349) centre (-35.398239, 10.704405) ccw
  arc A20 (-23.033237, -39.196839) -> (-19.714985, -42.931136) centre (-20.131998, -39.96026) ccw
  arc A21 (26.067828, -36.504734) -> (28.481656, -32.540714) centre (25.650815, -33.533859) ccw
  arc A22 (37.556198, 14.638245) -> (36.811722, 20.534134) centre (36.773621, 17.534376) ccw
  line L9 (-19.714985, -42.931136) -> (26.067828, -36.504734)
  line L10 (36.647882, 22.032619) -> (-0.586782, 20.9918)
  arc A23 (0.266708, 20.998306) -> (-0.586782, 20.9918) centre (0, 0) ccw
  arc A24 (-3.528521, 20.701438) -> (-4.473897, 20.517901) centre (0, 0) ccw
  line L11 (-4.473897, 20.517901) -> (-36.037367, 13.635534)
  line L12 (0.266708, 20.998306) -> (36.811722, 20.534134)
  dimension "d174" = 6
  dimension "d175" = 6
  dimension "d176" = 6
  dimension "d177" = 6
extrude "押し出し3" cut sketch "スケッチ4" against normal blind 10 contours A18 L8 A24 L11 A19 L0 | L7 A16 L6 A22 L12 A23 | A20 L9 A21 L4 A13 L3 A12 L2
equation "\"d4\" = d3"
equation "\"d6\" = d5"
equation "\"d8\" = d7"
equation "\"d10\" = d9"
equation "\"d16\" = d3"
equation "\"d17\" = d3"
equation "\"d27\" = d7"
equation "\"d46\" = d40"
equation "\"d47\" = d41"
equation "\"d63\" = d62"
equation "\"d64\" = d62"
properties part number "中間フレーム内内" material "アルミニウム 2014-T4"
